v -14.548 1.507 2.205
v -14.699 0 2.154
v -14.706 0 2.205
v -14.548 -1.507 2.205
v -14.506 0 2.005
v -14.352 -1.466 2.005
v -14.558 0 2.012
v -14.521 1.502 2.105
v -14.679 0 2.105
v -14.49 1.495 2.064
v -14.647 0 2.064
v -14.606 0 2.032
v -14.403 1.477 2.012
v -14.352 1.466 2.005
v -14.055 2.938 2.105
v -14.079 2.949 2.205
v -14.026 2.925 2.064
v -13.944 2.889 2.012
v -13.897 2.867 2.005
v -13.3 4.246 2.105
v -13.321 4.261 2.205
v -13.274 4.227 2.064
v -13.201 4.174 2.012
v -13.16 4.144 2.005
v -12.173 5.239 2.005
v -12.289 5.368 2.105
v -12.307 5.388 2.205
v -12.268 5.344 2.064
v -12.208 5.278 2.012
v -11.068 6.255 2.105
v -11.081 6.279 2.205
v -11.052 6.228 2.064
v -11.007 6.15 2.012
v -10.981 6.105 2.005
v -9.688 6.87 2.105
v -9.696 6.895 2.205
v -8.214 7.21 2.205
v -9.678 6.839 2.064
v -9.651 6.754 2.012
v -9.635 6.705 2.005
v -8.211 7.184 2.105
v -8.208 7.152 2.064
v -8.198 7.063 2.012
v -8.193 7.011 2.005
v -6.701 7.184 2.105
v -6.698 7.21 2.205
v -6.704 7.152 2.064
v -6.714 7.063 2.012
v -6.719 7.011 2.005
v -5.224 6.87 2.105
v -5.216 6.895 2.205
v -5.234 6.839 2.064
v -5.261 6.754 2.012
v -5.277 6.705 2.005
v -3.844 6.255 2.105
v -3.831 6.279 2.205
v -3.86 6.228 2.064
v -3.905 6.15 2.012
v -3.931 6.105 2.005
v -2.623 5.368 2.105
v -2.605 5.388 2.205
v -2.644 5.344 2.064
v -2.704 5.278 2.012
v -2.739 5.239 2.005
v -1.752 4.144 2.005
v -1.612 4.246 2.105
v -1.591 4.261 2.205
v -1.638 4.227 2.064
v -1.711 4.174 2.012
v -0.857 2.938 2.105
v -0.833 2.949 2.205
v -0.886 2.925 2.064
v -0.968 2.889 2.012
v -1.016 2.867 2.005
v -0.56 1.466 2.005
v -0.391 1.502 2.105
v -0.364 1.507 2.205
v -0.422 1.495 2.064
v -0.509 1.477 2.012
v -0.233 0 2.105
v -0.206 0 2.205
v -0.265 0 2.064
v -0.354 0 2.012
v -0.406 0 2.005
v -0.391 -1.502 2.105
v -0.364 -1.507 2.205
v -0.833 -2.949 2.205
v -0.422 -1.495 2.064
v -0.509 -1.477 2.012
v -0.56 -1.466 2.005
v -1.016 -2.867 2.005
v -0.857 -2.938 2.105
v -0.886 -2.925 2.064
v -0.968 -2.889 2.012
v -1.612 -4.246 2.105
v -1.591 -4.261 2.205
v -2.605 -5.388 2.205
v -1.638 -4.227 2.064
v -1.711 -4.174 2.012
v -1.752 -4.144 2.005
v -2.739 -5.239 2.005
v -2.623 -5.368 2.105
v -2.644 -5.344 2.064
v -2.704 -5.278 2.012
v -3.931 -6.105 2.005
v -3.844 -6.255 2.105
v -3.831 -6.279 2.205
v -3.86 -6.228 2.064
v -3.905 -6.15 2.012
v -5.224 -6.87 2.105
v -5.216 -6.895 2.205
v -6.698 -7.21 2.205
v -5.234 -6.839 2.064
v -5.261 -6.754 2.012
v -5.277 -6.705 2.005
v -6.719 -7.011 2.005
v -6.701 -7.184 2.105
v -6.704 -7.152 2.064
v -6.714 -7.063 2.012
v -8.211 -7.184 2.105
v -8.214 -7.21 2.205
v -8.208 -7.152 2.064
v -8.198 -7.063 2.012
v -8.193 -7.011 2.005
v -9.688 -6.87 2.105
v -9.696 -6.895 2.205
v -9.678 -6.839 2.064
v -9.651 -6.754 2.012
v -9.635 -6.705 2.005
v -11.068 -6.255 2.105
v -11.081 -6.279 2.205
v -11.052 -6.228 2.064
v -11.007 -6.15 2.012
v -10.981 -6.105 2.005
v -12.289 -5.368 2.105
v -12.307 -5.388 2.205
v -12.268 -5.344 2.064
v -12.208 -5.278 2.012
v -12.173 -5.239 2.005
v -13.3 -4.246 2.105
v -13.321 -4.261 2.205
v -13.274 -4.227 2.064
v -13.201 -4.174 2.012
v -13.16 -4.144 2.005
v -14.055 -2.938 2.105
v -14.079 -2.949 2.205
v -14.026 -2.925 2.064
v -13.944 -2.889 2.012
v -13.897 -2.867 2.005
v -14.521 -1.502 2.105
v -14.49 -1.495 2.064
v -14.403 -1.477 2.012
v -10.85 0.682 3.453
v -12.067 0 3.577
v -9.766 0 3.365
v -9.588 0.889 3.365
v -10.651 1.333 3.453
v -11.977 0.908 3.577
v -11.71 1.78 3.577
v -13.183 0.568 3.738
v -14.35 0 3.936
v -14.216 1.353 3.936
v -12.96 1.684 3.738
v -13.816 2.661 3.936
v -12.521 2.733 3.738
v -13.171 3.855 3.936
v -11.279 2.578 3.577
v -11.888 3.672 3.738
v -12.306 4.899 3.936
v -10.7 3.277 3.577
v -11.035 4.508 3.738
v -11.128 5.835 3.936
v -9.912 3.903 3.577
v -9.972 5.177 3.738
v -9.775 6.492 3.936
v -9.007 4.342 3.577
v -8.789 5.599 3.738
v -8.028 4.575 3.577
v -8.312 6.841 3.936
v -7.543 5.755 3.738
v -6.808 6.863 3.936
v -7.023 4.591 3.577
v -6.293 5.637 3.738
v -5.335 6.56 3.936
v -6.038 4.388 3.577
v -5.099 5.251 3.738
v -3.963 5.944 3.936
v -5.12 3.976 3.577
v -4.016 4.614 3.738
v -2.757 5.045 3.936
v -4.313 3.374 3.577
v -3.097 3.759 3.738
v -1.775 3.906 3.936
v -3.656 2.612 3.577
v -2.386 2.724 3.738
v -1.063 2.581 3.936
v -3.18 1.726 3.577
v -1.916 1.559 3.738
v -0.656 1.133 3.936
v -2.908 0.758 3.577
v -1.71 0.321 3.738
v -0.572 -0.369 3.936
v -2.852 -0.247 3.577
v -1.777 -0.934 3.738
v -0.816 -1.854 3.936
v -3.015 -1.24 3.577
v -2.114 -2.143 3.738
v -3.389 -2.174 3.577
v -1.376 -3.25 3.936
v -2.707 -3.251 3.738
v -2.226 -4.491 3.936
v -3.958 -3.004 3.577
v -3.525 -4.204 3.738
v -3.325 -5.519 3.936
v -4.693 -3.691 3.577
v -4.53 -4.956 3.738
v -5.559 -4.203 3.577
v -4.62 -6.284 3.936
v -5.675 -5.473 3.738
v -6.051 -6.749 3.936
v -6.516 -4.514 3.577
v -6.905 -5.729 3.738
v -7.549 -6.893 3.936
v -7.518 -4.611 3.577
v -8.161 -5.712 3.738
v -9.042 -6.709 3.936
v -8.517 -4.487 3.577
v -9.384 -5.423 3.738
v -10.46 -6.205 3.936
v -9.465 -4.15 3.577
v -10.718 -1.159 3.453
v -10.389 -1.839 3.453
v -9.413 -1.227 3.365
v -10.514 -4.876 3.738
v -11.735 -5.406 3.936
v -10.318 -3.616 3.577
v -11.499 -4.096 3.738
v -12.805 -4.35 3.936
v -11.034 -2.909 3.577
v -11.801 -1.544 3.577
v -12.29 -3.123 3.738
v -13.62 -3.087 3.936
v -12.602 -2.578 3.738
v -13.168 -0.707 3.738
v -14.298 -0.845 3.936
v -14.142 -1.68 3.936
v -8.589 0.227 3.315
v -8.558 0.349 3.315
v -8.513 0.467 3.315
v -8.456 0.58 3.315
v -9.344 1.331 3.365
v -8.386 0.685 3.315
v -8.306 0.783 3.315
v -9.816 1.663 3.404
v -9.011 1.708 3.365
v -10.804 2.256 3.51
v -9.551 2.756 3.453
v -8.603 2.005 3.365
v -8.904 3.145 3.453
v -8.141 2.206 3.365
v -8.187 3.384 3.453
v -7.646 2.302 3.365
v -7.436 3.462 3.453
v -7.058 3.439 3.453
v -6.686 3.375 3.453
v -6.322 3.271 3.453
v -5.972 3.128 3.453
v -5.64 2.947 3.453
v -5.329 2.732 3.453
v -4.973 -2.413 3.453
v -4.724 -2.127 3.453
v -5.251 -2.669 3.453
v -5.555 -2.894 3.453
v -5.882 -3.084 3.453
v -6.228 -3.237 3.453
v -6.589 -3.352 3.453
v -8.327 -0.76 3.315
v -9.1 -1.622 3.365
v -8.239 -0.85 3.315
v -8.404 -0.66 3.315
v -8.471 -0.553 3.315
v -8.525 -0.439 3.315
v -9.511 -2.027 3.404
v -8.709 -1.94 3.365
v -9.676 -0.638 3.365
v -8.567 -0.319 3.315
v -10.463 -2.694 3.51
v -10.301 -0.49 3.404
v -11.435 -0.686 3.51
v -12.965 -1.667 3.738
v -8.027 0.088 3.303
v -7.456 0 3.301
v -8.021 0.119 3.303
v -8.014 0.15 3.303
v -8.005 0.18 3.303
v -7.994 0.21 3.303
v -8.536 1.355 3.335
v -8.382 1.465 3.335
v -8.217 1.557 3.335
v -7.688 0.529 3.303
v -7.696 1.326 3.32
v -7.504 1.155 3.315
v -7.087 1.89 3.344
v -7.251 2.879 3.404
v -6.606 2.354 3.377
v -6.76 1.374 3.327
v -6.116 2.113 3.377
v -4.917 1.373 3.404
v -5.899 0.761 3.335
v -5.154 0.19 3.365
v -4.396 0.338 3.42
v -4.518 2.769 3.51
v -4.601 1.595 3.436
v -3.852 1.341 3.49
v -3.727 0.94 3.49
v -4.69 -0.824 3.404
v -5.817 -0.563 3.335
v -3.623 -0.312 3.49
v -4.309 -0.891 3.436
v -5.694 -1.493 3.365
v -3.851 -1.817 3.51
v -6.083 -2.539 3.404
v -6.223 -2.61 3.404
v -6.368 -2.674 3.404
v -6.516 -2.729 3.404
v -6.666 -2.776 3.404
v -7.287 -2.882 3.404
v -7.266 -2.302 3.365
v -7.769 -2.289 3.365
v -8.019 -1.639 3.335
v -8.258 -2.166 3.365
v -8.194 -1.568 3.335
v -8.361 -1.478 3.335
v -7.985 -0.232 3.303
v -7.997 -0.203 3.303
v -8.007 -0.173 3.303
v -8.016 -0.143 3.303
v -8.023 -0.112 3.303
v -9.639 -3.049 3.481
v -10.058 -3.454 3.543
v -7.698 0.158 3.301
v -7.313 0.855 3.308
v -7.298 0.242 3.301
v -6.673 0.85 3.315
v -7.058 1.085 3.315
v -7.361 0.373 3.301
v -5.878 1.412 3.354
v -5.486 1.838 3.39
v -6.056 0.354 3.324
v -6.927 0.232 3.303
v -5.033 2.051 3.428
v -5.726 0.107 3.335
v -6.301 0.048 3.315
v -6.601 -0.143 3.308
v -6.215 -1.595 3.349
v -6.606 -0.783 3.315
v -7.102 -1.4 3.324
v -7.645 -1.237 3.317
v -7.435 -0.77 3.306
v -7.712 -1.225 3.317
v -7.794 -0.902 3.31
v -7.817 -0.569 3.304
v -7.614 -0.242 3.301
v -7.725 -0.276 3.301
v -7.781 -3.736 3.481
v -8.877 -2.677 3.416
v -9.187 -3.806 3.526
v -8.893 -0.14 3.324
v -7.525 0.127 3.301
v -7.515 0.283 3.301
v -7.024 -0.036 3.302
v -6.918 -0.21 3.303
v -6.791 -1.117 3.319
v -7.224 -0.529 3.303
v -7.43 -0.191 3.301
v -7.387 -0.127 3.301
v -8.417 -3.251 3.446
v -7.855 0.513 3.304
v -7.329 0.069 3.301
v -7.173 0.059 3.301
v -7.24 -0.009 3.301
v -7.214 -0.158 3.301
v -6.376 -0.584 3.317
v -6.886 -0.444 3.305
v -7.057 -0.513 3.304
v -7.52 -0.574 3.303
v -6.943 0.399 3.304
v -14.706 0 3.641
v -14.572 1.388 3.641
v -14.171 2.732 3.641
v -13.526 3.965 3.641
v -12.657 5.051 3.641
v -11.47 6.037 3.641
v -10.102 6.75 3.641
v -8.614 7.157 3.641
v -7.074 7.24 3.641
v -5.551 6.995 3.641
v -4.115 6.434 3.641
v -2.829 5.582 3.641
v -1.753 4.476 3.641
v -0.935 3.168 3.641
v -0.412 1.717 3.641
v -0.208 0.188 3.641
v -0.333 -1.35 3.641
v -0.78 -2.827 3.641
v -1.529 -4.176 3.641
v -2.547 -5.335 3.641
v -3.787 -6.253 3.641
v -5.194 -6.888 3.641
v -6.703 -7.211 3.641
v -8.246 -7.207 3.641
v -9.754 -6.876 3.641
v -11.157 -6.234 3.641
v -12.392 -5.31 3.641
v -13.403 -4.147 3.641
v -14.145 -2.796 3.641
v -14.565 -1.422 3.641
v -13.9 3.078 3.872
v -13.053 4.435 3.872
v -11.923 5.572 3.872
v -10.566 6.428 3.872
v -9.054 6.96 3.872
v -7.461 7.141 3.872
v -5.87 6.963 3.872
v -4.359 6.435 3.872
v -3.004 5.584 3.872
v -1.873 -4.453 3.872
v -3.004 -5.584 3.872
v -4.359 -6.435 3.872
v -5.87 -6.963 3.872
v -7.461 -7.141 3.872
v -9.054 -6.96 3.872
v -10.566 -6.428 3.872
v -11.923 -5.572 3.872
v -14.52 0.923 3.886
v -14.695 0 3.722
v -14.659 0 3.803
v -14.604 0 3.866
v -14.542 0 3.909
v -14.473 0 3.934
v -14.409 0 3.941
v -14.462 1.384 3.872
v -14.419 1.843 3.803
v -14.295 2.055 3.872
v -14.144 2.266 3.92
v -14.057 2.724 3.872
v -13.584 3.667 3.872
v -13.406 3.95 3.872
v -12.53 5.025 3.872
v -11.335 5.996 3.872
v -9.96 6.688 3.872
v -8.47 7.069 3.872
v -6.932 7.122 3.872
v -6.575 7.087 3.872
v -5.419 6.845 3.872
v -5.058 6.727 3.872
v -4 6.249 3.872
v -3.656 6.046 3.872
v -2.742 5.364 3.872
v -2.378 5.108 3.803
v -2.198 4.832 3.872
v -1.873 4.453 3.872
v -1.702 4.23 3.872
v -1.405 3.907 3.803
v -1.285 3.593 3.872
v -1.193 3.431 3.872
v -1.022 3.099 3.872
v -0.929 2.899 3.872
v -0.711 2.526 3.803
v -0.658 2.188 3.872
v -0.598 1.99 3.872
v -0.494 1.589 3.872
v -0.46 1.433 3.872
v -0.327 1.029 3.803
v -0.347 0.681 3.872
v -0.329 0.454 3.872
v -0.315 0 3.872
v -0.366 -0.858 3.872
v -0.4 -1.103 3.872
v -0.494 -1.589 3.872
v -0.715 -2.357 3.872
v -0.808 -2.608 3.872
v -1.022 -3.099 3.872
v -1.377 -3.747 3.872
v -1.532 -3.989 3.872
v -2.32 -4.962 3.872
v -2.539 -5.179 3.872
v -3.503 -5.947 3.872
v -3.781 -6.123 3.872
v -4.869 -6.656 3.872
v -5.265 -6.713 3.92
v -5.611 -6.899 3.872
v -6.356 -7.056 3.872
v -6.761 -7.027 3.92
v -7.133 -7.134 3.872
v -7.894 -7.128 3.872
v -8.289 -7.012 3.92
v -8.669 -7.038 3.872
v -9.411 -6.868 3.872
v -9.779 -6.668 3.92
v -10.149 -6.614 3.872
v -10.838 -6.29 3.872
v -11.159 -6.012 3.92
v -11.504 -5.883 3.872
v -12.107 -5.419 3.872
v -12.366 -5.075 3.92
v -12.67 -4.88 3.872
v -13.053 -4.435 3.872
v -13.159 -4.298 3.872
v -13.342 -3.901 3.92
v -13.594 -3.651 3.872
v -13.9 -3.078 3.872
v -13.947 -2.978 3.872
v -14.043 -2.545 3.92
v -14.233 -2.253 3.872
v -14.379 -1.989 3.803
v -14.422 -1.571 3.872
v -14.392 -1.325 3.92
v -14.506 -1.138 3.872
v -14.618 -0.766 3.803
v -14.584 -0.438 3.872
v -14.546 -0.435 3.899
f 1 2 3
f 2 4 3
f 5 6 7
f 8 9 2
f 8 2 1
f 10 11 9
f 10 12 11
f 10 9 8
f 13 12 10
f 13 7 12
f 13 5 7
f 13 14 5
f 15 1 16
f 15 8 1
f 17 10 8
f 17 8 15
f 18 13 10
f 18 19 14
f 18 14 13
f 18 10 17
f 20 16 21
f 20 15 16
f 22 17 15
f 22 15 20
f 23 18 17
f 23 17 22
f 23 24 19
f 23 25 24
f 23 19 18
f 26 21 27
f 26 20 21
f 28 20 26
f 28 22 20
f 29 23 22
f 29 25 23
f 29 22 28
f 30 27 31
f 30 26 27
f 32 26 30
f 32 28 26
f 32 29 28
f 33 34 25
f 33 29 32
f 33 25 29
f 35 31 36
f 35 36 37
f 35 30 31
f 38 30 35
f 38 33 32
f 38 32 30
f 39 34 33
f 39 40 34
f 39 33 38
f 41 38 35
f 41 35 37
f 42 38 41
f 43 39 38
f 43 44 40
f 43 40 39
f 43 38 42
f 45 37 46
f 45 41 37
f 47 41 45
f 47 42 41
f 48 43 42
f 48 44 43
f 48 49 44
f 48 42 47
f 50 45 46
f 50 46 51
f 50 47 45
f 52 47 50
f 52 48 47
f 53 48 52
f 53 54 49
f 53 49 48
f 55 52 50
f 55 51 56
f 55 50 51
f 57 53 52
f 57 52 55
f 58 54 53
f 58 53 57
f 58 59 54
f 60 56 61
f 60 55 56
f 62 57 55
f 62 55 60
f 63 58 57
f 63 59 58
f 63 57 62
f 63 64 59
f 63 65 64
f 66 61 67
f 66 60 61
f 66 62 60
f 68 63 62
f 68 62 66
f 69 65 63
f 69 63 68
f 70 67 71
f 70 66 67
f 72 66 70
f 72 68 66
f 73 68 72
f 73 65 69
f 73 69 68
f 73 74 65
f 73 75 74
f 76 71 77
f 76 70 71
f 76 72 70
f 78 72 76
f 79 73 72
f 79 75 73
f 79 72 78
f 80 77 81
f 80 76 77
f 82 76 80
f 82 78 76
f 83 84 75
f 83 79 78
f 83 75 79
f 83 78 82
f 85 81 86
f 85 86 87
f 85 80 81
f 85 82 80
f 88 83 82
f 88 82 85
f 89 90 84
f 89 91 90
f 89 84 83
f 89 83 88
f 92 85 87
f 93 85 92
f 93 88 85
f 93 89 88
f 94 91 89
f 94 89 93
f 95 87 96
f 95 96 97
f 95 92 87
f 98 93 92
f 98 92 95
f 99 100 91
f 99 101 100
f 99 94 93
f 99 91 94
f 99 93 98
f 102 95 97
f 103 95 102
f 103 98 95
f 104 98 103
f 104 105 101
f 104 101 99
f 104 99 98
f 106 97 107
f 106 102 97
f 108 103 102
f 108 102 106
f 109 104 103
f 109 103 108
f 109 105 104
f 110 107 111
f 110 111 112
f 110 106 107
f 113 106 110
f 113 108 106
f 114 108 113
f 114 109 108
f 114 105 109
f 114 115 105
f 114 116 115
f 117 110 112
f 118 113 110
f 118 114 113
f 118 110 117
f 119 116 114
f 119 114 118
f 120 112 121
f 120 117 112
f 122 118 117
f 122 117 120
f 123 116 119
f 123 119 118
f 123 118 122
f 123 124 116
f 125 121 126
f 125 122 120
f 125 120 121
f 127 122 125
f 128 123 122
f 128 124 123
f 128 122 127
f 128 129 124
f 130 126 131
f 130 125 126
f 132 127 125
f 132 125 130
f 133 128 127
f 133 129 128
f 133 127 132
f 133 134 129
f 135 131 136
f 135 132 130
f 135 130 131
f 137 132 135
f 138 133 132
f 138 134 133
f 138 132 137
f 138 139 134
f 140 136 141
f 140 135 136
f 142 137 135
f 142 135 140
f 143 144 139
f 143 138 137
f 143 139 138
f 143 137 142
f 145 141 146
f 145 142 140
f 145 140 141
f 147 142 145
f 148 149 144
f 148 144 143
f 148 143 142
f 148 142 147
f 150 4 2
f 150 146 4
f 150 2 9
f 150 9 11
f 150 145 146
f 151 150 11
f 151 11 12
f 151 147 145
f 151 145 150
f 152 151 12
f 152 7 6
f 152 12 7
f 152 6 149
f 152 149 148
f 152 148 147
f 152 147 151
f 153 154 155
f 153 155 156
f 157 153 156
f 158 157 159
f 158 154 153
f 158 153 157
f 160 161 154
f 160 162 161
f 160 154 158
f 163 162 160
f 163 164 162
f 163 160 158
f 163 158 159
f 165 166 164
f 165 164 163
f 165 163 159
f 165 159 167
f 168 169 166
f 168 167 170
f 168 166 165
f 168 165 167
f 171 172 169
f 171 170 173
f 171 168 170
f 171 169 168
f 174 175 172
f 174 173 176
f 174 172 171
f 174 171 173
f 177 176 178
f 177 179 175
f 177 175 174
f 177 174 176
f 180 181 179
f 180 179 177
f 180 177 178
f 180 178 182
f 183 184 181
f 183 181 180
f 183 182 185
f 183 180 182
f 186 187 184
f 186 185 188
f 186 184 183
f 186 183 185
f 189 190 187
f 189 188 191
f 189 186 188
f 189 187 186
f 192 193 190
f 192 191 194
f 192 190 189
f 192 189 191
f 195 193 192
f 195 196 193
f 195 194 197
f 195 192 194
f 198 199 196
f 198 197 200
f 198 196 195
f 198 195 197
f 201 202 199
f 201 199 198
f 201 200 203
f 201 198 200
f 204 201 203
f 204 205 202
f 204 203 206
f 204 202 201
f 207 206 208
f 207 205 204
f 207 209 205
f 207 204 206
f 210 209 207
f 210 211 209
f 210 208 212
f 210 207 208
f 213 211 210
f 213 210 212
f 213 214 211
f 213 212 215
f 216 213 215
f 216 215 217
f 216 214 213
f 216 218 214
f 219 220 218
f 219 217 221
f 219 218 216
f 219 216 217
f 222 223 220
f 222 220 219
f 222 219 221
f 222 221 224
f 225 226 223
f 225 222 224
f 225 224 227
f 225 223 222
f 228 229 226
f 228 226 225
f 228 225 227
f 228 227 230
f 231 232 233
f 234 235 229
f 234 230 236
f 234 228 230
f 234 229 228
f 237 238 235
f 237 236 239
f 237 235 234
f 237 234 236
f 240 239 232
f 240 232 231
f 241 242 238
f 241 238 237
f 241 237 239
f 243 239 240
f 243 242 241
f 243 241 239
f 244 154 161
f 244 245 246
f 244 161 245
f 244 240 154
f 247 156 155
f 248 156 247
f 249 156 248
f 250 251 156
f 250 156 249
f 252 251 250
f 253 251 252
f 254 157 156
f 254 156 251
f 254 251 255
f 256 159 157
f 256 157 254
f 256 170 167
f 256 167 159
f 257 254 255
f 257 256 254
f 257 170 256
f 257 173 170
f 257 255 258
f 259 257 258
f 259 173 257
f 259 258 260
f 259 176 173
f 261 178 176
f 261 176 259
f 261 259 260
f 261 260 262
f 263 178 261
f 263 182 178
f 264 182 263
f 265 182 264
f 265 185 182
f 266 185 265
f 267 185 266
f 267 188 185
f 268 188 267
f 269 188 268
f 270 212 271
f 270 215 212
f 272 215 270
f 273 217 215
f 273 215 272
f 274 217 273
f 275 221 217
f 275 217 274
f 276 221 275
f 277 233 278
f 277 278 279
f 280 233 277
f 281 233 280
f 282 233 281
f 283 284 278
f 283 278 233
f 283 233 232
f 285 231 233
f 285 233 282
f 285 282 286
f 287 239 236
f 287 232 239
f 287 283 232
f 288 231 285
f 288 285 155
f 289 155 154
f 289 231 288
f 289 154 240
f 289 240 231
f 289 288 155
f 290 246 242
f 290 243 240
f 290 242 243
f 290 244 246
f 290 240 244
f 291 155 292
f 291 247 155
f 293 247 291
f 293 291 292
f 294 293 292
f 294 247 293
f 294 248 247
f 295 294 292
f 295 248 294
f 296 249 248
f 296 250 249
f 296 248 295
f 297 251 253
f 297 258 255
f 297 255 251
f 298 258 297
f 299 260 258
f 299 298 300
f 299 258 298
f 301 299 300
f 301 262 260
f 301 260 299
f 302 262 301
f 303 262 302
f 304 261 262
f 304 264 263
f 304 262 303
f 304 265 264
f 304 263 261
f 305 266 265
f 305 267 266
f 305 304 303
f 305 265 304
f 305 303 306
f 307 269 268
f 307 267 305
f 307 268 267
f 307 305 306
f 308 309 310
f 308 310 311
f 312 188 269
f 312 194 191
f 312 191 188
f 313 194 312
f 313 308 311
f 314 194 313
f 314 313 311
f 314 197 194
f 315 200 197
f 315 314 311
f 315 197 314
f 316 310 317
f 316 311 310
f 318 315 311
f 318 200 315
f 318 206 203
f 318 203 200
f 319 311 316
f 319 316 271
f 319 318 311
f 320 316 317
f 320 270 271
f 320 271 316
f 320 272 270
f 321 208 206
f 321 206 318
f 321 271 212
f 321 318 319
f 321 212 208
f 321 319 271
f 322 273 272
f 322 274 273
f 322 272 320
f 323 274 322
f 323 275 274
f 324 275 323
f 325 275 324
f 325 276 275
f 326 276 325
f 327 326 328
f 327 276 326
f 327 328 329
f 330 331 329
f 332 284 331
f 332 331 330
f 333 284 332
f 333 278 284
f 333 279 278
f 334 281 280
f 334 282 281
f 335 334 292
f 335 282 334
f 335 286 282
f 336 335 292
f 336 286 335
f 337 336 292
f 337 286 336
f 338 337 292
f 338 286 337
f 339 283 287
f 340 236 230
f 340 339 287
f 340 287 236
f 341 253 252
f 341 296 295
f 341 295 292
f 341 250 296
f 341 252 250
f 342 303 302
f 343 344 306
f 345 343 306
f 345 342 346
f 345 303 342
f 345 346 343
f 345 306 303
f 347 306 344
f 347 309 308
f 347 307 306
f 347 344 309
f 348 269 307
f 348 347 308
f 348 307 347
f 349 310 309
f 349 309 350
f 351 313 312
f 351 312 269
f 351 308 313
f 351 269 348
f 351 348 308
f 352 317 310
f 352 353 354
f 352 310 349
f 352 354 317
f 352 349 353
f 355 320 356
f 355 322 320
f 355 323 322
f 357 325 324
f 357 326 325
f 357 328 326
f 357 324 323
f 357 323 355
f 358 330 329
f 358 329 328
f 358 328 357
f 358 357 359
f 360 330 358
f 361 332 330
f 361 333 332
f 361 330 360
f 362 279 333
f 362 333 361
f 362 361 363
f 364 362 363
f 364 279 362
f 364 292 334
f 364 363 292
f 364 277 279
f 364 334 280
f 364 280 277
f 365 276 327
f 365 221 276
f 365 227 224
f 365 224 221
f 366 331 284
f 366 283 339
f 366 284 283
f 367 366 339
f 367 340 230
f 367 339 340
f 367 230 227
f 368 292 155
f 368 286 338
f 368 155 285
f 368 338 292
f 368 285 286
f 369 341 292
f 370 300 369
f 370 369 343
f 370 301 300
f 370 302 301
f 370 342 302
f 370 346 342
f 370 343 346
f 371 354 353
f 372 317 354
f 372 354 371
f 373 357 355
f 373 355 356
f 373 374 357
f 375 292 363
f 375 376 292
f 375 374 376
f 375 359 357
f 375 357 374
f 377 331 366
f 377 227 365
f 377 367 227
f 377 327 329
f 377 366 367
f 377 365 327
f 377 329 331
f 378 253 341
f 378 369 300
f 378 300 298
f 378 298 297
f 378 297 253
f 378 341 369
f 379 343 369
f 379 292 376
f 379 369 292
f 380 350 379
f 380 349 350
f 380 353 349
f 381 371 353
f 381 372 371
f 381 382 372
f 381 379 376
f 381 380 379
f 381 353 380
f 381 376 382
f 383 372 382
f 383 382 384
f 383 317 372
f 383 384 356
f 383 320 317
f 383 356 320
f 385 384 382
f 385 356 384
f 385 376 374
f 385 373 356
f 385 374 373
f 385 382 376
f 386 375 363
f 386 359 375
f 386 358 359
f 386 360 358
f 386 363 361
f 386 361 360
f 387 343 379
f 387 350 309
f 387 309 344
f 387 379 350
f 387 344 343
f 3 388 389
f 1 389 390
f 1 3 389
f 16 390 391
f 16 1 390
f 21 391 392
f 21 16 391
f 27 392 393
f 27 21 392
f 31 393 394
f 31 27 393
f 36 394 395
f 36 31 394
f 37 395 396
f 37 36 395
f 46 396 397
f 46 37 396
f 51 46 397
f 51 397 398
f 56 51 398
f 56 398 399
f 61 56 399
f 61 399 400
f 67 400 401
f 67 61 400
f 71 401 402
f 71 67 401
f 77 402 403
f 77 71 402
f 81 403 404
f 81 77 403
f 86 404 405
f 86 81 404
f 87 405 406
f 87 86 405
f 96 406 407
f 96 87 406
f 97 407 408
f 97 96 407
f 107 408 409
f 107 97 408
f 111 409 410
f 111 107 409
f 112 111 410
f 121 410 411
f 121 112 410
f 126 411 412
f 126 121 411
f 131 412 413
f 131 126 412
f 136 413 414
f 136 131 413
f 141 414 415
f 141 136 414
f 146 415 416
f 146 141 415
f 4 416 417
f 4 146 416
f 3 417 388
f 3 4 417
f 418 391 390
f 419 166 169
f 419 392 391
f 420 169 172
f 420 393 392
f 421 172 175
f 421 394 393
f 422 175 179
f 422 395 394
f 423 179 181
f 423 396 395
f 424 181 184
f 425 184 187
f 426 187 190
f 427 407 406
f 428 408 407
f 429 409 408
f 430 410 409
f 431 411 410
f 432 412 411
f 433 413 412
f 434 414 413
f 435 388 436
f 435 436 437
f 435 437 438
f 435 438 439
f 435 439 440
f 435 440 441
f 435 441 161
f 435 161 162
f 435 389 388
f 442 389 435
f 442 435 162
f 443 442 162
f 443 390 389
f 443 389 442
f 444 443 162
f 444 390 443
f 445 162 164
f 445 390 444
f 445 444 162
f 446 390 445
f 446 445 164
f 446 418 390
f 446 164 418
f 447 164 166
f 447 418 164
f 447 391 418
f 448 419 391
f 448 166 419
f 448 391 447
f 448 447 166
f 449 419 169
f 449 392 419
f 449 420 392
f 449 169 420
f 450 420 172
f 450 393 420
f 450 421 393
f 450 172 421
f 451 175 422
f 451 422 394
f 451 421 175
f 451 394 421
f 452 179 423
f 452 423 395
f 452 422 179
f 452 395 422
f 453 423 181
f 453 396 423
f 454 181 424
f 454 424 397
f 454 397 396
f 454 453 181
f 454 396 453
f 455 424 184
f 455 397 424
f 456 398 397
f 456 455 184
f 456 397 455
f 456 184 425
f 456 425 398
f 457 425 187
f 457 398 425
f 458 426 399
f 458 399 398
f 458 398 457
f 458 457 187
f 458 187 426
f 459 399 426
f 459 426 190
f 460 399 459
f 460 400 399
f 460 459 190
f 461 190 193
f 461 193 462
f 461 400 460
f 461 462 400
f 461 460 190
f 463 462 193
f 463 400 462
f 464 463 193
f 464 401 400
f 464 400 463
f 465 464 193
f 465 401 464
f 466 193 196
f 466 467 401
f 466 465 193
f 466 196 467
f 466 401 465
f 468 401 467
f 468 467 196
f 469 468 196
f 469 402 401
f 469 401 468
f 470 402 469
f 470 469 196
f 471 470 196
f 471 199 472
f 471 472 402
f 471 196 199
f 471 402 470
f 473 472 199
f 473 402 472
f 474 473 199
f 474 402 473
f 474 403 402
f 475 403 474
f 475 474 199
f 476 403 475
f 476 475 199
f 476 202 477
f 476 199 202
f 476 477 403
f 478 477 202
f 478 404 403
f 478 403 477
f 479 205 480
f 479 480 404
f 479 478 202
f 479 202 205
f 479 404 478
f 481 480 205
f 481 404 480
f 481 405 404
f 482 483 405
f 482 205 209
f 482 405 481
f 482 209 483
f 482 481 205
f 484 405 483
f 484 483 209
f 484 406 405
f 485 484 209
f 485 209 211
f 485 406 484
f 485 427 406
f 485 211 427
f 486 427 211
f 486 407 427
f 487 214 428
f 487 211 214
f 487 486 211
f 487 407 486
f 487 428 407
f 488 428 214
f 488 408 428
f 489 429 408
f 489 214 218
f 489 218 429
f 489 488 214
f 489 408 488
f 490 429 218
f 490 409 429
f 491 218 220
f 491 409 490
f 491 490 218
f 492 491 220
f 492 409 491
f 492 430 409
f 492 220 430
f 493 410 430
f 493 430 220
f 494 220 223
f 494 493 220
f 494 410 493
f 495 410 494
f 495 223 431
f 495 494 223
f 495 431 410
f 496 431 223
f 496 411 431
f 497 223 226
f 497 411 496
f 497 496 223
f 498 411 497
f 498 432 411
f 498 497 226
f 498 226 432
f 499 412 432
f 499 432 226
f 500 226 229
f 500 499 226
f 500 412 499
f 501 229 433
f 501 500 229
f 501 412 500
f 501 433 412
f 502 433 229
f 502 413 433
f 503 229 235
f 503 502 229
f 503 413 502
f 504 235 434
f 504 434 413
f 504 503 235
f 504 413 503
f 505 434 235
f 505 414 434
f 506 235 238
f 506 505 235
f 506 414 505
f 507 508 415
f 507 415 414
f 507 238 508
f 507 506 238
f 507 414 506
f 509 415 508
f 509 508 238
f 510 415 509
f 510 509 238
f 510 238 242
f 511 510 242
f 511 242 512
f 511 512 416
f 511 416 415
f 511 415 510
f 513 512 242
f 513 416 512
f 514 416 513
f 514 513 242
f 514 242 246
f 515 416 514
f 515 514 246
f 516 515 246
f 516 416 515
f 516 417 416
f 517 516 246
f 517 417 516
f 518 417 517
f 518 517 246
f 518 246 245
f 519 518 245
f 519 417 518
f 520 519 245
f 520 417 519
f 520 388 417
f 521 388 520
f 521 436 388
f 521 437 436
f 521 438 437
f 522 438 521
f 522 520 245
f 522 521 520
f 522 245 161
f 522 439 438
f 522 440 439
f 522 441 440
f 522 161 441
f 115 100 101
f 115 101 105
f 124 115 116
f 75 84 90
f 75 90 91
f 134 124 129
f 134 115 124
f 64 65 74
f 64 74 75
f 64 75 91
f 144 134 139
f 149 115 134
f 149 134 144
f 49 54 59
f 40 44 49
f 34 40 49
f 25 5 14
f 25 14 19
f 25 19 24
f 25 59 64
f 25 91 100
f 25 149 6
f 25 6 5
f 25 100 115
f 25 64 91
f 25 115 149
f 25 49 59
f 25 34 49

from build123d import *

# Parameters (mm, degrees)
F2_R = 0.2
F3_R = 0.3


with BuildPart() as f1:
    # F0 (on Front) → F1 (revolve)
    with BuildSketch(Plane.XZ):
        with BuildLine():
            ThreePointArc((-7.4560047481, 3.3008563332), (-11.0988060832, 3.4699396302), (-14.7060047481, 4.0053913267))
            Line((-14.7060047481, 4.0053913267), (-14.7060047481, 2.0053913267))
            Line((-14.7060047481, 2.0053913267), (-7.4560047481, 2.0053913267))
            Line((-7.4560047481, 2.0053913267), (-7.4560047481, 3.3008563332))
        make_face()
    revolve(axis=Axis((-7.4560047481, 0, 3.0053913267), (0, 0, -1)))

    # F2
    f2_edges = [f1.edges().sort_by_distance(p)[0] for p in [
        (-0.206005, 0, 2.005391),
    ]]
    fillet(f2_edges, radius=F2_R)

    # F3
    f3_edges = [f1.edges().sort_by_distance(p)[0] for p in [
        (-0.206005, 0, 4.005391),
    ]]
    fillet(f3_edges, radius=F3_R)


solid = f1.part
